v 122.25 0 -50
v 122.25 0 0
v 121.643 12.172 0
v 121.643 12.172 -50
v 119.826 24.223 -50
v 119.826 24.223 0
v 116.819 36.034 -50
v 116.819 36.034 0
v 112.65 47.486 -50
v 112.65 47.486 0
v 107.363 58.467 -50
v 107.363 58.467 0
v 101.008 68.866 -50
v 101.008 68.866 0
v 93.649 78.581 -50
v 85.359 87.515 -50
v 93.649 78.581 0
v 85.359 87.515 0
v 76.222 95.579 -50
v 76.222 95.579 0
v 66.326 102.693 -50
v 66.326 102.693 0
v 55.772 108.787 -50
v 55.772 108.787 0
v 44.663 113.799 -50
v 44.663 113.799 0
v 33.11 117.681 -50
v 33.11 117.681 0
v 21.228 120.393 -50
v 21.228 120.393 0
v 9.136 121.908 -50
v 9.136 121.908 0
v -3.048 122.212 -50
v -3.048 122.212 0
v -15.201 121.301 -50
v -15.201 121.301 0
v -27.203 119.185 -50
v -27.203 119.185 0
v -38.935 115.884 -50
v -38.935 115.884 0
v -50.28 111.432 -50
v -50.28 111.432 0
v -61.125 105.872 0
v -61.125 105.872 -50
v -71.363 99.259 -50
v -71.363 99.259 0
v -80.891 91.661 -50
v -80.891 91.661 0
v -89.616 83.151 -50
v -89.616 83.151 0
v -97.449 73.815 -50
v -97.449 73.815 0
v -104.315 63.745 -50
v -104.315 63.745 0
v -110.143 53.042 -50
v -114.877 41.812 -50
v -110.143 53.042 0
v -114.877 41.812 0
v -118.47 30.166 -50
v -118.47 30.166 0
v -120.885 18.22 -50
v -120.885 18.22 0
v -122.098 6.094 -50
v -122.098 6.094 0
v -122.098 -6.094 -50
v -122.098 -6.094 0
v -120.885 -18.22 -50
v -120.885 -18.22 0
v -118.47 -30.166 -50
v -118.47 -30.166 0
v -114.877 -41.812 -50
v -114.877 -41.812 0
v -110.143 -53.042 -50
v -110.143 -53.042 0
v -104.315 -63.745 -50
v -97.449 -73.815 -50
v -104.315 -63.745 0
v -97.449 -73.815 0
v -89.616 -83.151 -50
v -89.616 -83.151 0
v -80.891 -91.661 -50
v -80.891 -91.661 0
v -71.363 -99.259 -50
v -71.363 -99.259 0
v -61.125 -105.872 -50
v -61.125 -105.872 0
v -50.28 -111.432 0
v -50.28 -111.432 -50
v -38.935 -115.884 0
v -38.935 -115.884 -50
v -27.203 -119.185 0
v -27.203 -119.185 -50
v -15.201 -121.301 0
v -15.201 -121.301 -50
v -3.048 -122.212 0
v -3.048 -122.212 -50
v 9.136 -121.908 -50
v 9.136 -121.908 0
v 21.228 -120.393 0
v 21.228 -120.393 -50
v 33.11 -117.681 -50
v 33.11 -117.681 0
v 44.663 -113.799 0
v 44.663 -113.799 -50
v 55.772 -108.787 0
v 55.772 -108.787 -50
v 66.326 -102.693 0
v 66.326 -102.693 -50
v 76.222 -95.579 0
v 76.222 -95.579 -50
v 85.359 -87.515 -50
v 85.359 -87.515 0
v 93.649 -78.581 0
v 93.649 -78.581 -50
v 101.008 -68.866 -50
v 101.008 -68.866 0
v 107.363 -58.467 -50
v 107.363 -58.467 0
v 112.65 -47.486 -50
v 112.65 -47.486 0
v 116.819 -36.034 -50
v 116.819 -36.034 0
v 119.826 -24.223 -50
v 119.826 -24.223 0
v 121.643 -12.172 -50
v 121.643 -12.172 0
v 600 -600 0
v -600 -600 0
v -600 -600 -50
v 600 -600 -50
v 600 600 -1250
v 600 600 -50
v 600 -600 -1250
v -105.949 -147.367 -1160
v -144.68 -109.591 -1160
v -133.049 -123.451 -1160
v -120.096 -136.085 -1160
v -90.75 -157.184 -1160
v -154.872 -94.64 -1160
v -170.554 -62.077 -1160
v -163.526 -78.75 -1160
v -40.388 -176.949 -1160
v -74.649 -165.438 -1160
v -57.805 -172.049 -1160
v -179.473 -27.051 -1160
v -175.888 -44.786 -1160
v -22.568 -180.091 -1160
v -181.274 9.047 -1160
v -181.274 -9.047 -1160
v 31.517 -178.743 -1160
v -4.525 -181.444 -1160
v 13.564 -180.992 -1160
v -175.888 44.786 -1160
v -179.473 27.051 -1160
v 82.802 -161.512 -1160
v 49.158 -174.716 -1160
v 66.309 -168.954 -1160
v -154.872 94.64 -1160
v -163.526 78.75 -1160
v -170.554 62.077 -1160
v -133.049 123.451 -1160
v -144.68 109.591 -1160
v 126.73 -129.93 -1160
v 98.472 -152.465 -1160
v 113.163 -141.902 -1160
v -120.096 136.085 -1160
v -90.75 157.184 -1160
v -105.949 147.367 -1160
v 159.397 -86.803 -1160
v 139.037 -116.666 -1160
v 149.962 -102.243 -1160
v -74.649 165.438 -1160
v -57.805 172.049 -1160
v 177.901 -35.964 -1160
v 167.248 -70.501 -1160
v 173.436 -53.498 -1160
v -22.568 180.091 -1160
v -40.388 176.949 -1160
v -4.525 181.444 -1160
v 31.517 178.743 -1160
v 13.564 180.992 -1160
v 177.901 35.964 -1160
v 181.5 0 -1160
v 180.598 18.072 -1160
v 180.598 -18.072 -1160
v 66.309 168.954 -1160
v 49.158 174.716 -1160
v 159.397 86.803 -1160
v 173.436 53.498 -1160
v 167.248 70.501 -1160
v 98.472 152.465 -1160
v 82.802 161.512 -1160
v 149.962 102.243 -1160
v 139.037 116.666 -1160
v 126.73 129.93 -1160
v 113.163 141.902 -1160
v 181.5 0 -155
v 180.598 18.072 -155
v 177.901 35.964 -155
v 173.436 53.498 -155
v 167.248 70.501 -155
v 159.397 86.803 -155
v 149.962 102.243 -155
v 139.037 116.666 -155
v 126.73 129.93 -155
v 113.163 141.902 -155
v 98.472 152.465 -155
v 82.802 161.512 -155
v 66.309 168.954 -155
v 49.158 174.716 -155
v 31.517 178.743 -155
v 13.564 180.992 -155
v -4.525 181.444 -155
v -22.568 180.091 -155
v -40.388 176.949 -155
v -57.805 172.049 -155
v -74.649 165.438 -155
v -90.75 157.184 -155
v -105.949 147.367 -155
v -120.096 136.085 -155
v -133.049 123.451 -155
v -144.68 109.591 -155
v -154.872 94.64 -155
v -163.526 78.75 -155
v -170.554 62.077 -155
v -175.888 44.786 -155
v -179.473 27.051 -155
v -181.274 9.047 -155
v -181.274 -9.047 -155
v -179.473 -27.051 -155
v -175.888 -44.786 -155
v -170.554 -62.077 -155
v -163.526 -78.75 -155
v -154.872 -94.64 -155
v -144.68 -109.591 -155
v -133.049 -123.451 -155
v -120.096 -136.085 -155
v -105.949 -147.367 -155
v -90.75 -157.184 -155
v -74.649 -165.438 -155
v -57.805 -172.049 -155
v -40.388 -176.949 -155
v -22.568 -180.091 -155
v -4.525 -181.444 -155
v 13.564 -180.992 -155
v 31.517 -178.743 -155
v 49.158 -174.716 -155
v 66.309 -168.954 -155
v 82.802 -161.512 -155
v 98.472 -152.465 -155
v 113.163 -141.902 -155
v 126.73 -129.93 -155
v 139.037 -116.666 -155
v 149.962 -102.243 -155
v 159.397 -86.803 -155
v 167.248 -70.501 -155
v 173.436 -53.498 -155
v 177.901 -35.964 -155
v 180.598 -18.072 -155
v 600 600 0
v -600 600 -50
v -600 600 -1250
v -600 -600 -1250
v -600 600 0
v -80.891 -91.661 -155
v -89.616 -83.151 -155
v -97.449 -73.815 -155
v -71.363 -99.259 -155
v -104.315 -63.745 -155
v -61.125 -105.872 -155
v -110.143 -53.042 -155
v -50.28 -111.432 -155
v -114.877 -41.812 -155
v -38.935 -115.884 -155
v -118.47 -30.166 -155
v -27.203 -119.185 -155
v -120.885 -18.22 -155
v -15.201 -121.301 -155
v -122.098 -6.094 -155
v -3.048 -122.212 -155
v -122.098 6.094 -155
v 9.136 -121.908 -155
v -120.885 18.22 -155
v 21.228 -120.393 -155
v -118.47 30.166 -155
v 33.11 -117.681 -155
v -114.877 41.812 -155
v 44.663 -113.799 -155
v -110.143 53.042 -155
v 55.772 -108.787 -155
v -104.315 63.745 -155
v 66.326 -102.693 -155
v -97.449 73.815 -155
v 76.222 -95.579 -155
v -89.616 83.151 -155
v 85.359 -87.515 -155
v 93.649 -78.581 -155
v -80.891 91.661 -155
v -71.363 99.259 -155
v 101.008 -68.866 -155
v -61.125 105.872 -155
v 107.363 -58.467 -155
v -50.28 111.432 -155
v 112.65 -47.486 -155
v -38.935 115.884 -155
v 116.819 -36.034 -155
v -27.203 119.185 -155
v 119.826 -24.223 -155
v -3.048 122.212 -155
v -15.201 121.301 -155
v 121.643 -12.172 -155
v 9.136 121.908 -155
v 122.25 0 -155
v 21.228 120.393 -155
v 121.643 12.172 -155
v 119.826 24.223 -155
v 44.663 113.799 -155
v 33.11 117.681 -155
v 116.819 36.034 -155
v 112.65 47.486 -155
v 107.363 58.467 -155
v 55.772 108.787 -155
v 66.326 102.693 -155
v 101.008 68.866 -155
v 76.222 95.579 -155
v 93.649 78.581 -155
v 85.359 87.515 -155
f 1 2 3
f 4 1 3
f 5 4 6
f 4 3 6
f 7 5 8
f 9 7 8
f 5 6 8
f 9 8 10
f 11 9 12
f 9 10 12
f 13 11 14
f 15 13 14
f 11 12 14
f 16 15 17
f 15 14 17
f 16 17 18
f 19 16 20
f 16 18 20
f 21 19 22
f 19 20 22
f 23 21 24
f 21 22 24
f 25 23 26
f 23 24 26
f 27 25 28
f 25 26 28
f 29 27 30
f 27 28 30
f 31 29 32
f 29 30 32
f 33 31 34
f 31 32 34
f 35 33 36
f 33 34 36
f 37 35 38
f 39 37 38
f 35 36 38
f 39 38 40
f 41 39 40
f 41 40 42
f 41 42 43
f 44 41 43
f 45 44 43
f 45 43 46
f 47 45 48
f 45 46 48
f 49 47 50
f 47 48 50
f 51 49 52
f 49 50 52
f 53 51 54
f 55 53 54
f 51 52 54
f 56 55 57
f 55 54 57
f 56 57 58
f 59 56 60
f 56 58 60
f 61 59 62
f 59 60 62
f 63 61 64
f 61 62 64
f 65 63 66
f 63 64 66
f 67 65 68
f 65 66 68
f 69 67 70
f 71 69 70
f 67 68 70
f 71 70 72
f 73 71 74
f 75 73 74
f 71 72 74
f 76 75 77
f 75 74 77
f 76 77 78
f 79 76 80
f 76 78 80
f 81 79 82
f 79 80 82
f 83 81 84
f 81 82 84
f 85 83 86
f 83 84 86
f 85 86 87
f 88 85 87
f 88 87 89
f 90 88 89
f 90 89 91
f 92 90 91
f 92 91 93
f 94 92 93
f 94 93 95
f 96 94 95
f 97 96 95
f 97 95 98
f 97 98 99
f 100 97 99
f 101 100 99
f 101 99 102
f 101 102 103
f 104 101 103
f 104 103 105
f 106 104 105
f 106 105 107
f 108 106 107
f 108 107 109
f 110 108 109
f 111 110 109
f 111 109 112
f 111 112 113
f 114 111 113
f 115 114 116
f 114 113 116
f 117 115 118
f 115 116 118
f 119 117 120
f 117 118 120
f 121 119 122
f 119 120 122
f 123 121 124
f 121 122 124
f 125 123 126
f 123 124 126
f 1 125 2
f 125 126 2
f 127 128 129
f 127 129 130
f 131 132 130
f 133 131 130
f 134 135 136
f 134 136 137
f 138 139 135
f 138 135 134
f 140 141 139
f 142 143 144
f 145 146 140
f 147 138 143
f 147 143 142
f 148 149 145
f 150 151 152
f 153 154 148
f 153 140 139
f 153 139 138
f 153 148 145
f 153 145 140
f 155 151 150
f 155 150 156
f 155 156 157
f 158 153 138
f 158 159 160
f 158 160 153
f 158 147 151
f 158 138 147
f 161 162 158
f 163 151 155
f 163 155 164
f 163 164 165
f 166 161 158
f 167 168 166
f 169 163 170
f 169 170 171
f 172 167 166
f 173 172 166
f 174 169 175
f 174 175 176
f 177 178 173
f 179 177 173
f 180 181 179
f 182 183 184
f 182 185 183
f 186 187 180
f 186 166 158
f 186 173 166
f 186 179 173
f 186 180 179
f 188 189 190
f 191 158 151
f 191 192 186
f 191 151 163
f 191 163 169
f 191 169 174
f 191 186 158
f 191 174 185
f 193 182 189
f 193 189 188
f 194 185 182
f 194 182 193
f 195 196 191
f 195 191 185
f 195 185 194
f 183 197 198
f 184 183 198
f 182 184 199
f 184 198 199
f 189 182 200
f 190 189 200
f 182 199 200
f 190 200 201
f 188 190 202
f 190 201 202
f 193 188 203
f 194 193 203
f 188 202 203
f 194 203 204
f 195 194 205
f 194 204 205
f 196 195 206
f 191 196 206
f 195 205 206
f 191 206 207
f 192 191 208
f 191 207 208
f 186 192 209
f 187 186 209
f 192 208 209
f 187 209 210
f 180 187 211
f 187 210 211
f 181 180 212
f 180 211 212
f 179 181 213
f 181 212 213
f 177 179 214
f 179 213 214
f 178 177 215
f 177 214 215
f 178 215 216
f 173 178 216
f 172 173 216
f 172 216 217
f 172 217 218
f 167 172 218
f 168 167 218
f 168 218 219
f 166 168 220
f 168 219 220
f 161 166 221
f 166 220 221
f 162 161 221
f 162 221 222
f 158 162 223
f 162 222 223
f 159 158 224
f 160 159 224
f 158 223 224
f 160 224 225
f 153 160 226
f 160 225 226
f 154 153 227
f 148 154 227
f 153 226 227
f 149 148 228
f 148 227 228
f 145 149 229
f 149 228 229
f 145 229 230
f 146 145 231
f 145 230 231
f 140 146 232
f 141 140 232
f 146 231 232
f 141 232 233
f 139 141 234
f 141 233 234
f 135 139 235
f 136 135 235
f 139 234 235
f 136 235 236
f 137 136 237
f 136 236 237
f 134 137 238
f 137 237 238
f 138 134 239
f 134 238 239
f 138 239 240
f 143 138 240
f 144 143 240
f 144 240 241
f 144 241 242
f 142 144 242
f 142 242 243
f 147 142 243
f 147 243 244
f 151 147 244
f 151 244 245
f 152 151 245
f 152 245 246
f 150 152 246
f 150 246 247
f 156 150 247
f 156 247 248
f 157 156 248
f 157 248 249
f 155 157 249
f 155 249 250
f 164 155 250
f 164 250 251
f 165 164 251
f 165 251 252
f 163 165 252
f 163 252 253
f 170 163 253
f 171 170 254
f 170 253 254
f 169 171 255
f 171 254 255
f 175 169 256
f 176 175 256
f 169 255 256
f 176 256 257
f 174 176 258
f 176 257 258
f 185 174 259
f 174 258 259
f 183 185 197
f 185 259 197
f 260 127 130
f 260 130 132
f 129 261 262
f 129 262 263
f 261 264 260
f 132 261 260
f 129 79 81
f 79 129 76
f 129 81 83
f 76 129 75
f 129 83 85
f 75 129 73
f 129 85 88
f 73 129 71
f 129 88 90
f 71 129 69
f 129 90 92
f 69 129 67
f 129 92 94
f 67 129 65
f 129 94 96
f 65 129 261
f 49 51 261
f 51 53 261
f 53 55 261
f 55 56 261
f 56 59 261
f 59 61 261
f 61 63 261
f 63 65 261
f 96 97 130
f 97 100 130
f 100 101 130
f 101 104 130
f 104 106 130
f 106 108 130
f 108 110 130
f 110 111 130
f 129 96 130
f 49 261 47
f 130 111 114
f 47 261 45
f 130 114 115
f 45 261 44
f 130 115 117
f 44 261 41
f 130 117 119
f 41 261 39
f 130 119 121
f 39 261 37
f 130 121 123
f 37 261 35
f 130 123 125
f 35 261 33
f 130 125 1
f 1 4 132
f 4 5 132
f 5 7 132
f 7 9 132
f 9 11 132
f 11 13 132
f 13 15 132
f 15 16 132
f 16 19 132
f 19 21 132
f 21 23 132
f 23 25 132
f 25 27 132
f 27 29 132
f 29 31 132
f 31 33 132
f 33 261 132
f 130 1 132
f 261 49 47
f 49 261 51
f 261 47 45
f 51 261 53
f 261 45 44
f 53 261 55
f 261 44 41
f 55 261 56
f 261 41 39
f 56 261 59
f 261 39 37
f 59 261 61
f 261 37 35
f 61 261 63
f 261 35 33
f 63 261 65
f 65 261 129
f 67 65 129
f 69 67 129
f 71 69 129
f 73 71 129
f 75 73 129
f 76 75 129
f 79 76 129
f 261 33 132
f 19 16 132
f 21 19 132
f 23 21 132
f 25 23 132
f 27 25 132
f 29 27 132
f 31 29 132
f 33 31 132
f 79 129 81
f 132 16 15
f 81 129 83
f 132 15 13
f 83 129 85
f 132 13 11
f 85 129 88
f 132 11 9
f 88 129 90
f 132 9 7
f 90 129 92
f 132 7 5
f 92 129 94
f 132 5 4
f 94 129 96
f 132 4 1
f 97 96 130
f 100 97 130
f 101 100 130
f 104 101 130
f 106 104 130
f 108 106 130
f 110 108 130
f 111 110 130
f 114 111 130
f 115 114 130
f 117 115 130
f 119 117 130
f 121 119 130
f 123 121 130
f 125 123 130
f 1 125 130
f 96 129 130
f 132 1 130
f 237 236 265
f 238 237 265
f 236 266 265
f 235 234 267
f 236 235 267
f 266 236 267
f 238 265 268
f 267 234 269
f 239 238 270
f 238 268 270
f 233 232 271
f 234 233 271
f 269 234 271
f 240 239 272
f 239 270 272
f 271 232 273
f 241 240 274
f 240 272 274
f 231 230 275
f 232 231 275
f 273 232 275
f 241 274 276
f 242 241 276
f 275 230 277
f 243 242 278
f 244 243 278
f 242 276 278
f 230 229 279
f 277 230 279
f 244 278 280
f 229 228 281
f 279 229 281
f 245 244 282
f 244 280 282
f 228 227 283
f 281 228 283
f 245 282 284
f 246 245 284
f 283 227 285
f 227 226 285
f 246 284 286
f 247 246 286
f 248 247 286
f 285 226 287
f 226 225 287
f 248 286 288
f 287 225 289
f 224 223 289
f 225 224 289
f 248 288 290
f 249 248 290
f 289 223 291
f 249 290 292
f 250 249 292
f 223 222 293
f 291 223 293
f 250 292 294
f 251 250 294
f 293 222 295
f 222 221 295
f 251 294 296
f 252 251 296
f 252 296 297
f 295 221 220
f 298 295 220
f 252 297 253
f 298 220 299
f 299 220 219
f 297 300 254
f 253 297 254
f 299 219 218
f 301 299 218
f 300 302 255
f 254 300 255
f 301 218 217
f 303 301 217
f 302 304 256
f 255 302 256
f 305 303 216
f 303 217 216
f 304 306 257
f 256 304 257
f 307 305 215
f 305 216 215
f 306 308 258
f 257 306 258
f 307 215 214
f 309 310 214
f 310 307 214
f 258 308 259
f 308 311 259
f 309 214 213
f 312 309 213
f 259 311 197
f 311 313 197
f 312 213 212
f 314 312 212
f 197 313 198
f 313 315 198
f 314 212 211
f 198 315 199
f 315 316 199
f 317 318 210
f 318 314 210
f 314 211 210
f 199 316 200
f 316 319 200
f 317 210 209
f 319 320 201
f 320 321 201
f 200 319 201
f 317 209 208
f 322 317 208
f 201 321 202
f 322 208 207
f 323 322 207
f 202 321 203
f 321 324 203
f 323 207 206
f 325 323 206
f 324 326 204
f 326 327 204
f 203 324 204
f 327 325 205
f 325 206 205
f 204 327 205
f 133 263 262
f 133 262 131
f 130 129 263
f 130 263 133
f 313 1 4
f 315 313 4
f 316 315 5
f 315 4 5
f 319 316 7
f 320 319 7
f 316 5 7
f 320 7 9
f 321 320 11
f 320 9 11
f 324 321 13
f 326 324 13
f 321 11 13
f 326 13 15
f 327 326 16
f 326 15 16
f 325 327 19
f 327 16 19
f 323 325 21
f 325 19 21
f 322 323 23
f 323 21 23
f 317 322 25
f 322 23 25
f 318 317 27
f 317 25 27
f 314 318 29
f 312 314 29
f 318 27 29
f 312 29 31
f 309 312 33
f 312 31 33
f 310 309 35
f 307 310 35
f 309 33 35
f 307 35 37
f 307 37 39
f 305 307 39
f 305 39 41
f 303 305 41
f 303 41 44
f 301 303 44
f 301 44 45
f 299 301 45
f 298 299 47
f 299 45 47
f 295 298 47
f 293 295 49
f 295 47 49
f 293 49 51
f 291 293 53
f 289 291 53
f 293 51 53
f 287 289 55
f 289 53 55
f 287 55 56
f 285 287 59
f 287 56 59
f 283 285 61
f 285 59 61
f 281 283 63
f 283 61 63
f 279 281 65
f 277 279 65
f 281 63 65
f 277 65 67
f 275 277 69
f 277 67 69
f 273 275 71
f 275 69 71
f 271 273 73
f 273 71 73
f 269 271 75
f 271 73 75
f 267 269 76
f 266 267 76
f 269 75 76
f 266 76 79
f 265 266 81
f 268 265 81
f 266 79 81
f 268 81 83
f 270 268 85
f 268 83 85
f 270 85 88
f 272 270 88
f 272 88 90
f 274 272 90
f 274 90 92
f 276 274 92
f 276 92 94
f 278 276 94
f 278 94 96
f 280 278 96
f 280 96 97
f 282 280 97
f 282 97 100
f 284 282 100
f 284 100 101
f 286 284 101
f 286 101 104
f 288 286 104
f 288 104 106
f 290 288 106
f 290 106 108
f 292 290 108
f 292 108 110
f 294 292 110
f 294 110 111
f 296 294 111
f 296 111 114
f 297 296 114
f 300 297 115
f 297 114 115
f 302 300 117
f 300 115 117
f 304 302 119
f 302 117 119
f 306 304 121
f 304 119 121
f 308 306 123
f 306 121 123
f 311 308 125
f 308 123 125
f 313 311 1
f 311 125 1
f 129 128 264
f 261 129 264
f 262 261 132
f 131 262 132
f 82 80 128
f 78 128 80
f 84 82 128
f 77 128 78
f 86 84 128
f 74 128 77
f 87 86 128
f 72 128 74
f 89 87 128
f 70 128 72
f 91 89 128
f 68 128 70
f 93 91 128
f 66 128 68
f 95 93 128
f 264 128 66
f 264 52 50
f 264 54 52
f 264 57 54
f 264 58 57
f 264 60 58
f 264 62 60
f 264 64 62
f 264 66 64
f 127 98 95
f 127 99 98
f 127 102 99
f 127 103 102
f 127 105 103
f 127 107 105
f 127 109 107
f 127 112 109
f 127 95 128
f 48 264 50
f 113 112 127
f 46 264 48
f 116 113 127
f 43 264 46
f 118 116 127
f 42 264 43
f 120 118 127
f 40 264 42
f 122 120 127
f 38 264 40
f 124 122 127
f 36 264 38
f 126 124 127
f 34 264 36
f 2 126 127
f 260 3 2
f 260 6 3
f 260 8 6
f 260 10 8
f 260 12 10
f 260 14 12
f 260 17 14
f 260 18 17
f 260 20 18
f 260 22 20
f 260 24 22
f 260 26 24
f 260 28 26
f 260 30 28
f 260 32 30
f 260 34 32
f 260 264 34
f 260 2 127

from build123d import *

# Parameters (mm, degrees)
F0_W     = 1200
F0_H     = 1200
F0_R     = 122.25
F1_DEPTH = 50
F2_W     = 1200
F2_H     = 1200
F3_DEPTH = 1200
F4_R     = 122.25
F5_DEPTH = 105
F6_R     = 181.5
F7_DEPTH = 1005


with BuildPart() as f1:
    # F0 (on Top) → F1 (new body)
    with BuildSketch(Plane.XY):
        Rectangle(F0_W, F0_H)
        Circle(F0_R, mode=Mode.SUBTRACT)
    extrude(amount=-F1_DEPTH)


with BuildPart() as f3:
    # F2 (on face) → F3 (new body)
    with BuildSketch(Plane(origin=(0, 0, -50), x_dir=(1, 0, 0), z_dir=(0, 0, -1))):
        Rectangle(F2_W, F2_H)
    extrude(amount=F3_DEPTH)

    # F4 (on face) → F5 (cut)
    with BuildSketch(Plane.XY.offset(-50)):
        Circle(F4_R)
    extrude(amount=-F5_DEPTH, mode=Mode.SUBTRACT)

    # F6 (on face) → F7 (cut)
    with BuildSketch(Plane.XY.offset(-155)):
        Circle(F6_R)
    extrude(amount=-F7_DEPTH, mode=Mode.SUBTRACT)


solid = Compound([f1.part, f3.part])
